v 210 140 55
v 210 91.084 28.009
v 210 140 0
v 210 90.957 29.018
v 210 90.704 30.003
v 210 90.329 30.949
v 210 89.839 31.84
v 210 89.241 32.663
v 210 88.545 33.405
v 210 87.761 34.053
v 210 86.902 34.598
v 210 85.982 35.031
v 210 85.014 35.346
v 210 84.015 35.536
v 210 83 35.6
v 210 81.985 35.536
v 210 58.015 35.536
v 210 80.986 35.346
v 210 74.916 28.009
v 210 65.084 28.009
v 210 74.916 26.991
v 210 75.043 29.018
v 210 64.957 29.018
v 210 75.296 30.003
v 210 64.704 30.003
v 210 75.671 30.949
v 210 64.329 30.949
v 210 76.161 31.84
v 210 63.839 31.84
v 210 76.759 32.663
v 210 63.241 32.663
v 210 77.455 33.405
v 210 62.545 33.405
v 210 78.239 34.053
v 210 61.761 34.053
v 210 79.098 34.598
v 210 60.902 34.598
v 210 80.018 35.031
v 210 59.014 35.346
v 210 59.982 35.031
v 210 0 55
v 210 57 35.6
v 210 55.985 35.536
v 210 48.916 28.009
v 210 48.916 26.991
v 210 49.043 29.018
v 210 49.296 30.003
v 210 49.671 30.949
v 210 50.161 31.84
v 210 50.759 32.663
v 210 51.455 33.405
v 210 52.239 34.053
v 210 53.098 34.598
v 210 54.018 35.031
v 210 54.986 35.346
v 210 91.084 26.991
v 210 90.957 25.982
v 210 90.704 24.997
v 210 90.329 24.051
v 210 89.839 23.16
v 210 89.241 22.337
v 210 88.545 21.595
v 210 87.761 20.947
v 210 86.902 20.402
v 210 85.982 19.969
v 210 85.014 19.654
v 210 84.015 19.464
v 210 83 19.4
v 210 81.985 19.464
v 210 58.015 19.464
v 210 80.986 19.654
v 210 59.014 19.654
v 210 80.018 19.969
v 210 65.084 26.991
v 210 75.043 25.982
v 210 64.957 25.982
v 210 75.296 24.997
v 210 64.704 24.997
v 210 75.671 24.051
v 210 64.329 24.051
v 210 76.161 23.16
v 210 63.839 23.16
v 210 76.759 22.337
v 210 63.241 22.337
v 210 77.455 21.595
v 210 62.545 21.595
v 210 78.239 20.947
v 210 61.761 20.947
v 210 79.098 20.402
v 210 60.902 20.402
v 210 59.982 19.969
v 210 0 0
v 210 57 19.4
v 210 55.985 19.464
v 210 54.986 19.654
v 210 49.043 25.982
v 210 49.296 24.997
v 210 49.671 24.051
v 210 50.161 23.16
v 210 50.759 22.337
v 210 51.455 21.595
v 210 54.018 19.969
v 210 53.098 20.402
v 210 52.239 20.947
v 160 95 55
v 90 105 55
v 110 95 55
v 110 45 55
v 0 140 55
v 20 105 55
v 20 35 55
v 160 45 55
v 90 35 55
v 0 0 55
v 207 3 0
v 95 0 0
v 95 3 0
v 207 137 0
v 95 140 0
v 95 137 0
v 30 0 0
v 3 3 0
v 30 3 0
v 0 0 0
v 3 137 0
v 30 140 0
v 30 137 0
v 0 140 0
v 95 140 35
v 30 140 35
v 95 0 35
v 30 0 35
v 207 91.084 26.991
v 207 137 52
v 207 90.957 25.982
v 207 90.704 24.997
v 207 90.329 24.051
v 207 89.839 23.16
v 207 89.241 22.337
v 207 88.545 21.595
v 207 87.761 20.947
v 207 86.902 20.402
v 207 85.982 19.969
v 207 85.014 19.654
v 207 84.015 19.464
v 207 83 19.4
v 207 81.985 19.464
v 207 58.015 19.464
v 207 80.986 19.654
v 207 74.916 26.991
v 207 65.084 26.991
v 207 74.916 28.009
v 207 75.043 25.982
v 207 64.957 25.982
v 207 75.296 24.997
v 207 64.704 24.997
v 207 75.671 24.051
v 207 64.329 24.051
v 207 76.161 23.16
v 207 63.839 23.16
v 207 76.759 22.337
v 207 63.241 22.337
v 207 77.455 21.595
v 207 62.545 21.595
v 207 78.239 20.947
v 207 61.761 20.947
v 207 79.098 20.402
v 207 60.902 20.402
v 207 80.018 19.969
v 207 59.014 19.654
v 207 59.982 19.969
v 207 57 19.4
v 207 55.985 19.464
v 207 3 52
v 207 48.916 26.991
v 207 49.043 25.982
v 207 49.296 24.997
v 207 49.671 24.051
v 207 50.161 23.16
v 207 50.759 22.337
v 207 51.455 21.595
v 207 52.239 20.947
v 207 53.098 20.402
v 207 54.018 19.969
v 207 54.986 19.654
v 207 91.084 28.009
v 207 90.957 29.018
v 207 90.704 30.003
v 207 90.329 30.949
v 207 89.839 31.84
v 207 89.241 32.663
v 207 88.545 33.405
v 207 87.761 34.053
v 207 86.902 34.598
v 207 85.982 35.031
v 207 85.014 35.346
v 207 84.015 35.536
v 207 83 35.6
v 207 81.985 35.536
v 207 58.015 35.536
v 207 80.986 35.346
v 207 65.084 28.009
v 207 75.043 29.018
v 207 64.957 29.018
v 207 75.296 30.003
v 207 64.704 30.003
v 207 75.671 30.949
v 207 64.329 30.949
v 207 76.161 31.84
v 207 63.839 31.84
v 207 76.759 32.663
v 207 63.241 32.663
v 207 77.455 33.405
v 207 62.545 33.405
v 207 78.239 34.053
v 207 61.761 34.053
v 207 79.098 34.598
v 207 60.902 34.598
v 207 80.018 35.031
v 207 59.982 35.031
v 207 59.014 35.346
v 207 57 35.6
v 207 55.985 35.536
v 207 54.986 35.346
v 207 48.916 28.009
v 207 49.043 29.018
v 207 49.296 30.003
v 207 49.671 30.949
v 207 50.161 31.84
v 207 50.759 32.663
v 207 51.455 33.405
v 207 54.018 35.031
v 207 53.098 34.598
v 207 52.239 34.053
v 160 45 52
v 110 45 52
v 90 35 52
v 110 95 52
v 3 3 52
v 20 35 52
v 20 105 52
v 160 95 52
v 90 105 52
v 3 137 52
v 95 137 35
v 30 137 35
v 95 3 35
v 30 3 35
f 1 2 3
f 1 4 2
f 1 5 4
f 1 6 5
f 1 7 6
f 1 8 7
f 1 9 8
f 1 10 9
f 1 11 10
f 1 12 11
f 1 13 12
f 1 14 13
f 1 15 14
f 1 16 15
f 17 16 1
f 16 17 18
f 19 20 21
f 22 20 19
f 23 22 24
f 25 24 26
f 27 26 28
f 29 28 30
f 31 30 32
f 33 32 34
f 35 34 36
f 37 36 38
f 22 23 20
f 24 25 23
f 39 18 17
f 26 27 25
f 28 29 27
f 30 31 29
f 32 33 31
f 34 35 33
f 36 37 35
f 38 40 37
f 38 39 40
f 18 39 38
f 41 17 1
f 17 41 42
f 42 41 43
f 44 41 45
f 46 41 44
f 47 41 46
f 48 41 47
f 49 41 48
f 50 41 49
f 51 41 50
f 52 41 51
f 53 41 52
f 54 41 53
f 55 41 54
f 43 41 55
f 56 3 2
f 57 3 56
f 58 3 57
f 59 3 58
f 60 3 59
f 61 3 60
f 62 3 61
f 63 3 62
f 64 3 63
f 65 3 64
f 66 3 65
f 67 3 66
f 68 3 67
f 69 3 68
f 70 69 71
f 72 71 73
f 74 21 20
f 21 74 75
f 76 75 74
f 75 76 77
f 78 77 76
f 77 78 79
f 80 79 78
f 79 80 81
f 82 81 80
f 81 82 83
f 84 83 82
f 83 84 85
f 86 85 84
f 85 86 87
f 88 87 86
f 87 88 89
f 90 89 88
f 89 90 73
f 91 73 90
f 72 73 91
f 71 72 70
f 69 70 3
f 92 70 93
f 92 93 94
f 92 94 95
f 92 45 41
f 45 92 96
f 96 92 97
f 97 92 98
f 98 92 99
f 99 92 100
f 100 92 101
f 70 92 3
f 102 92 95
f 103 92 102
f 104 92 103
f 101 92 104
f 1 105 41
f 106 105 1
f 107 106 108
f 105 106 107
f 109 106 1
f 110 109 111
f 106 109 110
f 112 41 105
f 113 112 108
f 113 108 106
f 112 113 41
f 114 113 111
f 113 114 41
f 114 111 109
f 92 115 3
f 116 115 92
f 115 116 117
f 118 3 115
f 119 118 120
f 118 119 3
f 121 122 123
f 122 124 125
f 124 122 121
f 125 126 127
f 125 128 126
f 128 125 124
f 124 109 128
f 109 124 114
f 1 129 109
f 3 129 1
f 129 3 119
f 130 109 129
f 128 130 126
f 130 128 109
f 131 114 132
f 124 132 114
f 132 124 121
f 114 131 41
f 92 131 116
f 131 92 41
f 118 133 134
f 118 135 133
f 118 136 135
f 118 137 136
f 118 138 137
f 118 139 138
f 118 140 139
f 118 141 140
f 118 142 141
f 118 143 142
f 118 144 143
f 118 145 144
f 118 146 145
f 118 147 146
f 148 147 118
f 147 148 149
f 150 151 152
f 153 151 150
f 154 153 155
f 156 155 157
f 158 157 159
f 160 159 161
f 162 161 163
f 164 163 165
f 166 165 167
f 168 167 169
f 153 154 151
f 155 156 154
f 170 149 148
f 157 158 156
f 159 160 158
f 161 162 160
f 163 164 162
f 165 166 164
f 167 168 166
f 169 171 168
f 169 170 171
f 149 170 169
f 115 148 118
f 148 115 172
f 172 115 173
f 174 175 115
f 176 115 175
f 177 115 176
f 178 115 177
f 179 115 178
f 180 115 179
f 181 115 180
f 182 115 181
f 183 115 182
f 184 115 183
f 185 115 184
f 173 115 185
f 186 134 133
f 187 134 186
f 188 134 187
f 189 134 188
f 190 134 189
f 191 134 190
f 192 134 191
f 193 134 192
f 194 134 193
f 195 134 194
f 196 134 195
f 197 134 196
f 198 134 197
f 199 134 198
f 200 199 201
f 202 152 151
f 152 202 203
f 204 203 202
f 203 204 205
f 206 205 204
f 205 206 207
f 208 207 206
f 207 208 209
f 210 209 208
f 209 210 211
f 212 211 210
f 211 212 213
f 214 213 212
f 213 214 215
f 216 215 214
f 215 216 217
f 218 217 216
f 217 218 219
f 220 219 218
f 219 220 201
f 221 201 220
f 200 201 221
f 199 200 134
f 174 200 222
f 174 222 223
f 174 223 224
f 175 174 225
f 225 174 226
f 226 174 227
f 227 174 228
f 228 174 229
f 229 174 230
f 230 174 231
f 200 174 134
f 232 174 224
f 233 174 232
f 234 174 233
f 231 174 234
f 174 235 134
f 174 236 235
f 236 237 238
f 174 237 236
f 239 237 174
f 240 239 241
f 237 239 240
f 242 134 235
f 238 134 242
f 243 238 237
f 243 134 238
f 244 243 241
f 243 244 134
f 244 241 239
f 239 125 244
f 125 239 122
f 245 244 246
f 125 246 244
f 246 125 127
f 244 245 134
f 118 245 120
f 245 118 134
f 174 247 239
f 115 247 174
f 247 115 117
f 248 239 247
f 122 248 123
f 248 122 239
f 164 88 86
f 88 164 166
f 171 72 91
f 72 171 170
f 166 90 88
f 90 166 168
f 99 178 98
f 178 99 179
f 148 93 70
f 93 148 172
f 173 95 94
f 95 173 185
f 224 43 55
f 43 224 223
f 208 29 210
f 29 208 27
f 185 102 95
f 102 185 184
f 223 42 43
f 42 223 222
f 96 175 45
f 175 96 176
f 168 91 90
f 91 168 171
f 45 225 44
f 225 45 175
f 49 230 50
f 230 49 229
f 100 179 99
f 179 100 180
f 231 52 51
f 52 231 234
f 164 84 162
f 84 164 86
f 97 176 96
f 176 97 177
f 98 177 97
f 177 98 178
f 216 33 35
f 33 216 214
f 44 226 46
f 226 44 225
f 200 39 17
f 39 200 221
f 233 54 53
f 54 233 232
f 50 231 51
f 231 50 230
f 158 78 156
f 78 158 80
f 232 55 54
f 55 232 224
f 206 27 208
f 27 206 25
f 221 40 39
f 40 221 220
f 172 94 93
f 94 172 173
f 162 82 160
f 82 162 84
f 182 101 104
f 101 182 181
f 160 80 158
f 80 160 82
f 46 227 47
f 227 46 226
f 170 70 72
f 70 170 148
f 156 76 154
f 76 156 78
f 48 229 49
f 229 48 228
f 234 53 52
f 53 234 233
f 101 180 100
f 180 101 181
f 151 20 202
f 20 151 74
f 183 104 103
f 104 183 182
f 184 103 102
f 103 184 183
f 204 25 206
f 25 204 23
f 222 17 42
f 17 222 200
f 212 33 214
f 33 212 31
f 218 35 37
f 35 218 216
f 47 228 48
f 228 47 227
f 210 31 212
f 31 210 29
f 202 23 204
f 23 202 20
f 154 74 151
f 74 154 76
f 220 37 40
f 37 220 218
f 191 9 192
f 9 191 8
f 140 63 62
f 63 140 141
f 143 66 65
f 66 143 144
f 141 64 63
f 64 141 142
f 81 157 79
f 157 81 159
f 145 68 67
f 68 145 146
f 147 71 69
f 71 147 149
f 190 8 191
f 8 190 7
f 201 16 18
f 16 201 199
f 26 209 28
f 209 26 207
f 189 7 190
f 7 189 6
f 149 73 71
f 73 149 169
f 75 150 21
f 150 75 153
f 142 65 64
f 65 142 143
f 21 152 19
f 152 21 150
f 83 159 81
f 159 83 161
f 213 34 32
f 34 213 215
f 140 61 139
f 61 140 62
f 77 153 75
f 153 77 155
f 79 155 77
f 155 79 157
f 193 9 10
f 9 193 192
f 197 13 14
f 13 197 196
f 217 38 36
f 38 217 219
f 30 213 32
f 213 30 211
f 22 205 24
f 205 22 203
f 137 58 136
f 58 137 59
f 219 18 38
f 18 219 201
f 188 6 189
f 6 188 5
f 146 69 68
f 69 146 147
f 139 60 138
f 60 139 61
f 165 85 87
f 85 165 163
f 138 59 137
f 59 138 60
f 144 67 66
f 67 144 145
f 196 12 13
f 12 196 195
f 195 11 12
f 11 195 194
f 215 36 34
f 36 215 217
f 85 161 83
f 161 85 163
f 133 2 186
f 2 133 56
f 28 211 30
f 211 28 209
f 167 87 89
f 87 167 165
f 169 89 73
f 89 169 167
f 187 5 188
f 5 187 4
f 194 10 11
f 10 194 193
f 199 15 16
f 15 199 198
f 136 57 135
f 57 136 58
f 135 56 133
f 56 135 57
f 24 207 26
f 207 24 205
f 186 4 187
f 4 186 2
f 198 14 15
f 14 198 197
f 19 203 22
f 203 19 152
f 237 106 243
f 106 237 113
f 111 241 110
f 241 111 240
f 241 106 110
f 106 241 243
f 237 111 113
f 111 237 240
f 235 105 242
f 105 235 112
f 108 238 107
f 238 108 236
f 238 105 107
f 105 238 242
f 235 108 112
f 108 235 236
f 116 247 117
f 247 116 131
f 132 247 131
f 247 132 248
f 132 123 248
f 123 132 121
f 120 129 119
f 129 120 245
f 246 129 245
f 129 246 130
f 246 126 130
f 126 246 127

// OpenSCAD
// ==============================================================================
// Projeto: Carenagem Funcional do Carrinho-Robô 2WD (Modelo B)
// Autores: Veela - StartUp ONE
// Curso: Engenharia de Software - FIAP
// ==============================================================================

// Parâmetros Gerais e Diretrizes (Conforme PDF Aula 14)
espessura_parede = 3;   // Espessura mínima para evitar empenamento e quebra
tolerancia = 0.2;       // Tolerância para encaixe rápido (+0.2mm)
furo_m3 = 3.4;          // Furo com folga testada para parafusos M3 (3.2 - 3.4mm)

// Dimensões da Carenagem Baseadas no Chassi de Acrílico (Valores em mm)
comp_chassi = 210;
largura_chassi = 140;
altura_carenagem = 55;

module carenagem_funcional() {
    difference() {
        // 1. Corpo principal (Bloco sólido da carenagem)
        cube([comp_chassi, largura_chassi, altura_carenagem]);

        // 2. Oco interno (Subtrai um bloco menor para deixar a parede com 3mm)
        translate([espessura_parede, espessura_parede, -espessura_parede])
            cube([
                comp_chassi - (2 * espessura_parede), 
                largura_chassi - (2 * espessura_parede), 
                altura_carenagem
            ]);

        // 3. Recorte Frontal: Sensor Ultrassônico HC-SR04
        // Furos de 16mm (+ tolerância) com espaçamento centralizado
        translate([comp_chassi, (largura_chassi/2) - 13, altura_carenagem/2])
            rotate([0, 90, 0]) 
            cylinder(h=20, d=16 + tolerancia, center=true, $fn=50);
            
        translate([comp_chassi, (largura_chassi/2) + 13, altura_carenagem/2])
            rotate([0, 90, 0]) 
            cylinder(h=20, d=16 + tolerancia, center=true, $fn=50);

        // 4. Recorte Superior (Traseira): Acesso à Bateria Removível
        translate([20, (largura_chassi/2) - 35, altura_carenagem - 10])
            cube([70, 70, 20]);

        // 5. Recorte Superior (Frente): Acesso à porta USB do ESP32
        translate([110, (largura_chassi/2) - 25, altura_carenagem - 10])
            cube([50, 50, 20]);

        // 6. Recorte Lateral: Motores Expostos para Manutenção Fácil
        // Lado Esquerdo
        translate([30, -10, -10])
            cube([65, espessura_parede + 15, 45]);
        // Lado Direito
        translate([30, largura_chassi - espessura_parede - 5, -10])
            cube([65, espessura_parede + 15, 45]);
            
        // 7. Furos M3 para fixação da carenagem na base de acrílico
        // Furo Traseiro Esquerdo
        translate([15, 15, 0]) 
            cylinder(h=20, d=furo_m3, center=true, $fn=30);
        // Furo Traseiro Direito
        translate([15, largura_chassi - 15, 0]) 
            cylinder(h=20, d=furo_m3, center=true, $fn=30);
        // Furo Dianteiro Esquerdo
        translate([comp_chassi - 20, 15, 0]) 
            cylinder(h=20, d=furo_m3, center=true, $fn=30);
        // Furo Dianteiro Direito
        translate([comp_chassi - 20, largura_chassi - 15, 0]) 
            cylinder(h=20, d=furo_m3, center=true, $fn=30);
    }
}

// Renderiza a peça final
carenagem_funcional();
